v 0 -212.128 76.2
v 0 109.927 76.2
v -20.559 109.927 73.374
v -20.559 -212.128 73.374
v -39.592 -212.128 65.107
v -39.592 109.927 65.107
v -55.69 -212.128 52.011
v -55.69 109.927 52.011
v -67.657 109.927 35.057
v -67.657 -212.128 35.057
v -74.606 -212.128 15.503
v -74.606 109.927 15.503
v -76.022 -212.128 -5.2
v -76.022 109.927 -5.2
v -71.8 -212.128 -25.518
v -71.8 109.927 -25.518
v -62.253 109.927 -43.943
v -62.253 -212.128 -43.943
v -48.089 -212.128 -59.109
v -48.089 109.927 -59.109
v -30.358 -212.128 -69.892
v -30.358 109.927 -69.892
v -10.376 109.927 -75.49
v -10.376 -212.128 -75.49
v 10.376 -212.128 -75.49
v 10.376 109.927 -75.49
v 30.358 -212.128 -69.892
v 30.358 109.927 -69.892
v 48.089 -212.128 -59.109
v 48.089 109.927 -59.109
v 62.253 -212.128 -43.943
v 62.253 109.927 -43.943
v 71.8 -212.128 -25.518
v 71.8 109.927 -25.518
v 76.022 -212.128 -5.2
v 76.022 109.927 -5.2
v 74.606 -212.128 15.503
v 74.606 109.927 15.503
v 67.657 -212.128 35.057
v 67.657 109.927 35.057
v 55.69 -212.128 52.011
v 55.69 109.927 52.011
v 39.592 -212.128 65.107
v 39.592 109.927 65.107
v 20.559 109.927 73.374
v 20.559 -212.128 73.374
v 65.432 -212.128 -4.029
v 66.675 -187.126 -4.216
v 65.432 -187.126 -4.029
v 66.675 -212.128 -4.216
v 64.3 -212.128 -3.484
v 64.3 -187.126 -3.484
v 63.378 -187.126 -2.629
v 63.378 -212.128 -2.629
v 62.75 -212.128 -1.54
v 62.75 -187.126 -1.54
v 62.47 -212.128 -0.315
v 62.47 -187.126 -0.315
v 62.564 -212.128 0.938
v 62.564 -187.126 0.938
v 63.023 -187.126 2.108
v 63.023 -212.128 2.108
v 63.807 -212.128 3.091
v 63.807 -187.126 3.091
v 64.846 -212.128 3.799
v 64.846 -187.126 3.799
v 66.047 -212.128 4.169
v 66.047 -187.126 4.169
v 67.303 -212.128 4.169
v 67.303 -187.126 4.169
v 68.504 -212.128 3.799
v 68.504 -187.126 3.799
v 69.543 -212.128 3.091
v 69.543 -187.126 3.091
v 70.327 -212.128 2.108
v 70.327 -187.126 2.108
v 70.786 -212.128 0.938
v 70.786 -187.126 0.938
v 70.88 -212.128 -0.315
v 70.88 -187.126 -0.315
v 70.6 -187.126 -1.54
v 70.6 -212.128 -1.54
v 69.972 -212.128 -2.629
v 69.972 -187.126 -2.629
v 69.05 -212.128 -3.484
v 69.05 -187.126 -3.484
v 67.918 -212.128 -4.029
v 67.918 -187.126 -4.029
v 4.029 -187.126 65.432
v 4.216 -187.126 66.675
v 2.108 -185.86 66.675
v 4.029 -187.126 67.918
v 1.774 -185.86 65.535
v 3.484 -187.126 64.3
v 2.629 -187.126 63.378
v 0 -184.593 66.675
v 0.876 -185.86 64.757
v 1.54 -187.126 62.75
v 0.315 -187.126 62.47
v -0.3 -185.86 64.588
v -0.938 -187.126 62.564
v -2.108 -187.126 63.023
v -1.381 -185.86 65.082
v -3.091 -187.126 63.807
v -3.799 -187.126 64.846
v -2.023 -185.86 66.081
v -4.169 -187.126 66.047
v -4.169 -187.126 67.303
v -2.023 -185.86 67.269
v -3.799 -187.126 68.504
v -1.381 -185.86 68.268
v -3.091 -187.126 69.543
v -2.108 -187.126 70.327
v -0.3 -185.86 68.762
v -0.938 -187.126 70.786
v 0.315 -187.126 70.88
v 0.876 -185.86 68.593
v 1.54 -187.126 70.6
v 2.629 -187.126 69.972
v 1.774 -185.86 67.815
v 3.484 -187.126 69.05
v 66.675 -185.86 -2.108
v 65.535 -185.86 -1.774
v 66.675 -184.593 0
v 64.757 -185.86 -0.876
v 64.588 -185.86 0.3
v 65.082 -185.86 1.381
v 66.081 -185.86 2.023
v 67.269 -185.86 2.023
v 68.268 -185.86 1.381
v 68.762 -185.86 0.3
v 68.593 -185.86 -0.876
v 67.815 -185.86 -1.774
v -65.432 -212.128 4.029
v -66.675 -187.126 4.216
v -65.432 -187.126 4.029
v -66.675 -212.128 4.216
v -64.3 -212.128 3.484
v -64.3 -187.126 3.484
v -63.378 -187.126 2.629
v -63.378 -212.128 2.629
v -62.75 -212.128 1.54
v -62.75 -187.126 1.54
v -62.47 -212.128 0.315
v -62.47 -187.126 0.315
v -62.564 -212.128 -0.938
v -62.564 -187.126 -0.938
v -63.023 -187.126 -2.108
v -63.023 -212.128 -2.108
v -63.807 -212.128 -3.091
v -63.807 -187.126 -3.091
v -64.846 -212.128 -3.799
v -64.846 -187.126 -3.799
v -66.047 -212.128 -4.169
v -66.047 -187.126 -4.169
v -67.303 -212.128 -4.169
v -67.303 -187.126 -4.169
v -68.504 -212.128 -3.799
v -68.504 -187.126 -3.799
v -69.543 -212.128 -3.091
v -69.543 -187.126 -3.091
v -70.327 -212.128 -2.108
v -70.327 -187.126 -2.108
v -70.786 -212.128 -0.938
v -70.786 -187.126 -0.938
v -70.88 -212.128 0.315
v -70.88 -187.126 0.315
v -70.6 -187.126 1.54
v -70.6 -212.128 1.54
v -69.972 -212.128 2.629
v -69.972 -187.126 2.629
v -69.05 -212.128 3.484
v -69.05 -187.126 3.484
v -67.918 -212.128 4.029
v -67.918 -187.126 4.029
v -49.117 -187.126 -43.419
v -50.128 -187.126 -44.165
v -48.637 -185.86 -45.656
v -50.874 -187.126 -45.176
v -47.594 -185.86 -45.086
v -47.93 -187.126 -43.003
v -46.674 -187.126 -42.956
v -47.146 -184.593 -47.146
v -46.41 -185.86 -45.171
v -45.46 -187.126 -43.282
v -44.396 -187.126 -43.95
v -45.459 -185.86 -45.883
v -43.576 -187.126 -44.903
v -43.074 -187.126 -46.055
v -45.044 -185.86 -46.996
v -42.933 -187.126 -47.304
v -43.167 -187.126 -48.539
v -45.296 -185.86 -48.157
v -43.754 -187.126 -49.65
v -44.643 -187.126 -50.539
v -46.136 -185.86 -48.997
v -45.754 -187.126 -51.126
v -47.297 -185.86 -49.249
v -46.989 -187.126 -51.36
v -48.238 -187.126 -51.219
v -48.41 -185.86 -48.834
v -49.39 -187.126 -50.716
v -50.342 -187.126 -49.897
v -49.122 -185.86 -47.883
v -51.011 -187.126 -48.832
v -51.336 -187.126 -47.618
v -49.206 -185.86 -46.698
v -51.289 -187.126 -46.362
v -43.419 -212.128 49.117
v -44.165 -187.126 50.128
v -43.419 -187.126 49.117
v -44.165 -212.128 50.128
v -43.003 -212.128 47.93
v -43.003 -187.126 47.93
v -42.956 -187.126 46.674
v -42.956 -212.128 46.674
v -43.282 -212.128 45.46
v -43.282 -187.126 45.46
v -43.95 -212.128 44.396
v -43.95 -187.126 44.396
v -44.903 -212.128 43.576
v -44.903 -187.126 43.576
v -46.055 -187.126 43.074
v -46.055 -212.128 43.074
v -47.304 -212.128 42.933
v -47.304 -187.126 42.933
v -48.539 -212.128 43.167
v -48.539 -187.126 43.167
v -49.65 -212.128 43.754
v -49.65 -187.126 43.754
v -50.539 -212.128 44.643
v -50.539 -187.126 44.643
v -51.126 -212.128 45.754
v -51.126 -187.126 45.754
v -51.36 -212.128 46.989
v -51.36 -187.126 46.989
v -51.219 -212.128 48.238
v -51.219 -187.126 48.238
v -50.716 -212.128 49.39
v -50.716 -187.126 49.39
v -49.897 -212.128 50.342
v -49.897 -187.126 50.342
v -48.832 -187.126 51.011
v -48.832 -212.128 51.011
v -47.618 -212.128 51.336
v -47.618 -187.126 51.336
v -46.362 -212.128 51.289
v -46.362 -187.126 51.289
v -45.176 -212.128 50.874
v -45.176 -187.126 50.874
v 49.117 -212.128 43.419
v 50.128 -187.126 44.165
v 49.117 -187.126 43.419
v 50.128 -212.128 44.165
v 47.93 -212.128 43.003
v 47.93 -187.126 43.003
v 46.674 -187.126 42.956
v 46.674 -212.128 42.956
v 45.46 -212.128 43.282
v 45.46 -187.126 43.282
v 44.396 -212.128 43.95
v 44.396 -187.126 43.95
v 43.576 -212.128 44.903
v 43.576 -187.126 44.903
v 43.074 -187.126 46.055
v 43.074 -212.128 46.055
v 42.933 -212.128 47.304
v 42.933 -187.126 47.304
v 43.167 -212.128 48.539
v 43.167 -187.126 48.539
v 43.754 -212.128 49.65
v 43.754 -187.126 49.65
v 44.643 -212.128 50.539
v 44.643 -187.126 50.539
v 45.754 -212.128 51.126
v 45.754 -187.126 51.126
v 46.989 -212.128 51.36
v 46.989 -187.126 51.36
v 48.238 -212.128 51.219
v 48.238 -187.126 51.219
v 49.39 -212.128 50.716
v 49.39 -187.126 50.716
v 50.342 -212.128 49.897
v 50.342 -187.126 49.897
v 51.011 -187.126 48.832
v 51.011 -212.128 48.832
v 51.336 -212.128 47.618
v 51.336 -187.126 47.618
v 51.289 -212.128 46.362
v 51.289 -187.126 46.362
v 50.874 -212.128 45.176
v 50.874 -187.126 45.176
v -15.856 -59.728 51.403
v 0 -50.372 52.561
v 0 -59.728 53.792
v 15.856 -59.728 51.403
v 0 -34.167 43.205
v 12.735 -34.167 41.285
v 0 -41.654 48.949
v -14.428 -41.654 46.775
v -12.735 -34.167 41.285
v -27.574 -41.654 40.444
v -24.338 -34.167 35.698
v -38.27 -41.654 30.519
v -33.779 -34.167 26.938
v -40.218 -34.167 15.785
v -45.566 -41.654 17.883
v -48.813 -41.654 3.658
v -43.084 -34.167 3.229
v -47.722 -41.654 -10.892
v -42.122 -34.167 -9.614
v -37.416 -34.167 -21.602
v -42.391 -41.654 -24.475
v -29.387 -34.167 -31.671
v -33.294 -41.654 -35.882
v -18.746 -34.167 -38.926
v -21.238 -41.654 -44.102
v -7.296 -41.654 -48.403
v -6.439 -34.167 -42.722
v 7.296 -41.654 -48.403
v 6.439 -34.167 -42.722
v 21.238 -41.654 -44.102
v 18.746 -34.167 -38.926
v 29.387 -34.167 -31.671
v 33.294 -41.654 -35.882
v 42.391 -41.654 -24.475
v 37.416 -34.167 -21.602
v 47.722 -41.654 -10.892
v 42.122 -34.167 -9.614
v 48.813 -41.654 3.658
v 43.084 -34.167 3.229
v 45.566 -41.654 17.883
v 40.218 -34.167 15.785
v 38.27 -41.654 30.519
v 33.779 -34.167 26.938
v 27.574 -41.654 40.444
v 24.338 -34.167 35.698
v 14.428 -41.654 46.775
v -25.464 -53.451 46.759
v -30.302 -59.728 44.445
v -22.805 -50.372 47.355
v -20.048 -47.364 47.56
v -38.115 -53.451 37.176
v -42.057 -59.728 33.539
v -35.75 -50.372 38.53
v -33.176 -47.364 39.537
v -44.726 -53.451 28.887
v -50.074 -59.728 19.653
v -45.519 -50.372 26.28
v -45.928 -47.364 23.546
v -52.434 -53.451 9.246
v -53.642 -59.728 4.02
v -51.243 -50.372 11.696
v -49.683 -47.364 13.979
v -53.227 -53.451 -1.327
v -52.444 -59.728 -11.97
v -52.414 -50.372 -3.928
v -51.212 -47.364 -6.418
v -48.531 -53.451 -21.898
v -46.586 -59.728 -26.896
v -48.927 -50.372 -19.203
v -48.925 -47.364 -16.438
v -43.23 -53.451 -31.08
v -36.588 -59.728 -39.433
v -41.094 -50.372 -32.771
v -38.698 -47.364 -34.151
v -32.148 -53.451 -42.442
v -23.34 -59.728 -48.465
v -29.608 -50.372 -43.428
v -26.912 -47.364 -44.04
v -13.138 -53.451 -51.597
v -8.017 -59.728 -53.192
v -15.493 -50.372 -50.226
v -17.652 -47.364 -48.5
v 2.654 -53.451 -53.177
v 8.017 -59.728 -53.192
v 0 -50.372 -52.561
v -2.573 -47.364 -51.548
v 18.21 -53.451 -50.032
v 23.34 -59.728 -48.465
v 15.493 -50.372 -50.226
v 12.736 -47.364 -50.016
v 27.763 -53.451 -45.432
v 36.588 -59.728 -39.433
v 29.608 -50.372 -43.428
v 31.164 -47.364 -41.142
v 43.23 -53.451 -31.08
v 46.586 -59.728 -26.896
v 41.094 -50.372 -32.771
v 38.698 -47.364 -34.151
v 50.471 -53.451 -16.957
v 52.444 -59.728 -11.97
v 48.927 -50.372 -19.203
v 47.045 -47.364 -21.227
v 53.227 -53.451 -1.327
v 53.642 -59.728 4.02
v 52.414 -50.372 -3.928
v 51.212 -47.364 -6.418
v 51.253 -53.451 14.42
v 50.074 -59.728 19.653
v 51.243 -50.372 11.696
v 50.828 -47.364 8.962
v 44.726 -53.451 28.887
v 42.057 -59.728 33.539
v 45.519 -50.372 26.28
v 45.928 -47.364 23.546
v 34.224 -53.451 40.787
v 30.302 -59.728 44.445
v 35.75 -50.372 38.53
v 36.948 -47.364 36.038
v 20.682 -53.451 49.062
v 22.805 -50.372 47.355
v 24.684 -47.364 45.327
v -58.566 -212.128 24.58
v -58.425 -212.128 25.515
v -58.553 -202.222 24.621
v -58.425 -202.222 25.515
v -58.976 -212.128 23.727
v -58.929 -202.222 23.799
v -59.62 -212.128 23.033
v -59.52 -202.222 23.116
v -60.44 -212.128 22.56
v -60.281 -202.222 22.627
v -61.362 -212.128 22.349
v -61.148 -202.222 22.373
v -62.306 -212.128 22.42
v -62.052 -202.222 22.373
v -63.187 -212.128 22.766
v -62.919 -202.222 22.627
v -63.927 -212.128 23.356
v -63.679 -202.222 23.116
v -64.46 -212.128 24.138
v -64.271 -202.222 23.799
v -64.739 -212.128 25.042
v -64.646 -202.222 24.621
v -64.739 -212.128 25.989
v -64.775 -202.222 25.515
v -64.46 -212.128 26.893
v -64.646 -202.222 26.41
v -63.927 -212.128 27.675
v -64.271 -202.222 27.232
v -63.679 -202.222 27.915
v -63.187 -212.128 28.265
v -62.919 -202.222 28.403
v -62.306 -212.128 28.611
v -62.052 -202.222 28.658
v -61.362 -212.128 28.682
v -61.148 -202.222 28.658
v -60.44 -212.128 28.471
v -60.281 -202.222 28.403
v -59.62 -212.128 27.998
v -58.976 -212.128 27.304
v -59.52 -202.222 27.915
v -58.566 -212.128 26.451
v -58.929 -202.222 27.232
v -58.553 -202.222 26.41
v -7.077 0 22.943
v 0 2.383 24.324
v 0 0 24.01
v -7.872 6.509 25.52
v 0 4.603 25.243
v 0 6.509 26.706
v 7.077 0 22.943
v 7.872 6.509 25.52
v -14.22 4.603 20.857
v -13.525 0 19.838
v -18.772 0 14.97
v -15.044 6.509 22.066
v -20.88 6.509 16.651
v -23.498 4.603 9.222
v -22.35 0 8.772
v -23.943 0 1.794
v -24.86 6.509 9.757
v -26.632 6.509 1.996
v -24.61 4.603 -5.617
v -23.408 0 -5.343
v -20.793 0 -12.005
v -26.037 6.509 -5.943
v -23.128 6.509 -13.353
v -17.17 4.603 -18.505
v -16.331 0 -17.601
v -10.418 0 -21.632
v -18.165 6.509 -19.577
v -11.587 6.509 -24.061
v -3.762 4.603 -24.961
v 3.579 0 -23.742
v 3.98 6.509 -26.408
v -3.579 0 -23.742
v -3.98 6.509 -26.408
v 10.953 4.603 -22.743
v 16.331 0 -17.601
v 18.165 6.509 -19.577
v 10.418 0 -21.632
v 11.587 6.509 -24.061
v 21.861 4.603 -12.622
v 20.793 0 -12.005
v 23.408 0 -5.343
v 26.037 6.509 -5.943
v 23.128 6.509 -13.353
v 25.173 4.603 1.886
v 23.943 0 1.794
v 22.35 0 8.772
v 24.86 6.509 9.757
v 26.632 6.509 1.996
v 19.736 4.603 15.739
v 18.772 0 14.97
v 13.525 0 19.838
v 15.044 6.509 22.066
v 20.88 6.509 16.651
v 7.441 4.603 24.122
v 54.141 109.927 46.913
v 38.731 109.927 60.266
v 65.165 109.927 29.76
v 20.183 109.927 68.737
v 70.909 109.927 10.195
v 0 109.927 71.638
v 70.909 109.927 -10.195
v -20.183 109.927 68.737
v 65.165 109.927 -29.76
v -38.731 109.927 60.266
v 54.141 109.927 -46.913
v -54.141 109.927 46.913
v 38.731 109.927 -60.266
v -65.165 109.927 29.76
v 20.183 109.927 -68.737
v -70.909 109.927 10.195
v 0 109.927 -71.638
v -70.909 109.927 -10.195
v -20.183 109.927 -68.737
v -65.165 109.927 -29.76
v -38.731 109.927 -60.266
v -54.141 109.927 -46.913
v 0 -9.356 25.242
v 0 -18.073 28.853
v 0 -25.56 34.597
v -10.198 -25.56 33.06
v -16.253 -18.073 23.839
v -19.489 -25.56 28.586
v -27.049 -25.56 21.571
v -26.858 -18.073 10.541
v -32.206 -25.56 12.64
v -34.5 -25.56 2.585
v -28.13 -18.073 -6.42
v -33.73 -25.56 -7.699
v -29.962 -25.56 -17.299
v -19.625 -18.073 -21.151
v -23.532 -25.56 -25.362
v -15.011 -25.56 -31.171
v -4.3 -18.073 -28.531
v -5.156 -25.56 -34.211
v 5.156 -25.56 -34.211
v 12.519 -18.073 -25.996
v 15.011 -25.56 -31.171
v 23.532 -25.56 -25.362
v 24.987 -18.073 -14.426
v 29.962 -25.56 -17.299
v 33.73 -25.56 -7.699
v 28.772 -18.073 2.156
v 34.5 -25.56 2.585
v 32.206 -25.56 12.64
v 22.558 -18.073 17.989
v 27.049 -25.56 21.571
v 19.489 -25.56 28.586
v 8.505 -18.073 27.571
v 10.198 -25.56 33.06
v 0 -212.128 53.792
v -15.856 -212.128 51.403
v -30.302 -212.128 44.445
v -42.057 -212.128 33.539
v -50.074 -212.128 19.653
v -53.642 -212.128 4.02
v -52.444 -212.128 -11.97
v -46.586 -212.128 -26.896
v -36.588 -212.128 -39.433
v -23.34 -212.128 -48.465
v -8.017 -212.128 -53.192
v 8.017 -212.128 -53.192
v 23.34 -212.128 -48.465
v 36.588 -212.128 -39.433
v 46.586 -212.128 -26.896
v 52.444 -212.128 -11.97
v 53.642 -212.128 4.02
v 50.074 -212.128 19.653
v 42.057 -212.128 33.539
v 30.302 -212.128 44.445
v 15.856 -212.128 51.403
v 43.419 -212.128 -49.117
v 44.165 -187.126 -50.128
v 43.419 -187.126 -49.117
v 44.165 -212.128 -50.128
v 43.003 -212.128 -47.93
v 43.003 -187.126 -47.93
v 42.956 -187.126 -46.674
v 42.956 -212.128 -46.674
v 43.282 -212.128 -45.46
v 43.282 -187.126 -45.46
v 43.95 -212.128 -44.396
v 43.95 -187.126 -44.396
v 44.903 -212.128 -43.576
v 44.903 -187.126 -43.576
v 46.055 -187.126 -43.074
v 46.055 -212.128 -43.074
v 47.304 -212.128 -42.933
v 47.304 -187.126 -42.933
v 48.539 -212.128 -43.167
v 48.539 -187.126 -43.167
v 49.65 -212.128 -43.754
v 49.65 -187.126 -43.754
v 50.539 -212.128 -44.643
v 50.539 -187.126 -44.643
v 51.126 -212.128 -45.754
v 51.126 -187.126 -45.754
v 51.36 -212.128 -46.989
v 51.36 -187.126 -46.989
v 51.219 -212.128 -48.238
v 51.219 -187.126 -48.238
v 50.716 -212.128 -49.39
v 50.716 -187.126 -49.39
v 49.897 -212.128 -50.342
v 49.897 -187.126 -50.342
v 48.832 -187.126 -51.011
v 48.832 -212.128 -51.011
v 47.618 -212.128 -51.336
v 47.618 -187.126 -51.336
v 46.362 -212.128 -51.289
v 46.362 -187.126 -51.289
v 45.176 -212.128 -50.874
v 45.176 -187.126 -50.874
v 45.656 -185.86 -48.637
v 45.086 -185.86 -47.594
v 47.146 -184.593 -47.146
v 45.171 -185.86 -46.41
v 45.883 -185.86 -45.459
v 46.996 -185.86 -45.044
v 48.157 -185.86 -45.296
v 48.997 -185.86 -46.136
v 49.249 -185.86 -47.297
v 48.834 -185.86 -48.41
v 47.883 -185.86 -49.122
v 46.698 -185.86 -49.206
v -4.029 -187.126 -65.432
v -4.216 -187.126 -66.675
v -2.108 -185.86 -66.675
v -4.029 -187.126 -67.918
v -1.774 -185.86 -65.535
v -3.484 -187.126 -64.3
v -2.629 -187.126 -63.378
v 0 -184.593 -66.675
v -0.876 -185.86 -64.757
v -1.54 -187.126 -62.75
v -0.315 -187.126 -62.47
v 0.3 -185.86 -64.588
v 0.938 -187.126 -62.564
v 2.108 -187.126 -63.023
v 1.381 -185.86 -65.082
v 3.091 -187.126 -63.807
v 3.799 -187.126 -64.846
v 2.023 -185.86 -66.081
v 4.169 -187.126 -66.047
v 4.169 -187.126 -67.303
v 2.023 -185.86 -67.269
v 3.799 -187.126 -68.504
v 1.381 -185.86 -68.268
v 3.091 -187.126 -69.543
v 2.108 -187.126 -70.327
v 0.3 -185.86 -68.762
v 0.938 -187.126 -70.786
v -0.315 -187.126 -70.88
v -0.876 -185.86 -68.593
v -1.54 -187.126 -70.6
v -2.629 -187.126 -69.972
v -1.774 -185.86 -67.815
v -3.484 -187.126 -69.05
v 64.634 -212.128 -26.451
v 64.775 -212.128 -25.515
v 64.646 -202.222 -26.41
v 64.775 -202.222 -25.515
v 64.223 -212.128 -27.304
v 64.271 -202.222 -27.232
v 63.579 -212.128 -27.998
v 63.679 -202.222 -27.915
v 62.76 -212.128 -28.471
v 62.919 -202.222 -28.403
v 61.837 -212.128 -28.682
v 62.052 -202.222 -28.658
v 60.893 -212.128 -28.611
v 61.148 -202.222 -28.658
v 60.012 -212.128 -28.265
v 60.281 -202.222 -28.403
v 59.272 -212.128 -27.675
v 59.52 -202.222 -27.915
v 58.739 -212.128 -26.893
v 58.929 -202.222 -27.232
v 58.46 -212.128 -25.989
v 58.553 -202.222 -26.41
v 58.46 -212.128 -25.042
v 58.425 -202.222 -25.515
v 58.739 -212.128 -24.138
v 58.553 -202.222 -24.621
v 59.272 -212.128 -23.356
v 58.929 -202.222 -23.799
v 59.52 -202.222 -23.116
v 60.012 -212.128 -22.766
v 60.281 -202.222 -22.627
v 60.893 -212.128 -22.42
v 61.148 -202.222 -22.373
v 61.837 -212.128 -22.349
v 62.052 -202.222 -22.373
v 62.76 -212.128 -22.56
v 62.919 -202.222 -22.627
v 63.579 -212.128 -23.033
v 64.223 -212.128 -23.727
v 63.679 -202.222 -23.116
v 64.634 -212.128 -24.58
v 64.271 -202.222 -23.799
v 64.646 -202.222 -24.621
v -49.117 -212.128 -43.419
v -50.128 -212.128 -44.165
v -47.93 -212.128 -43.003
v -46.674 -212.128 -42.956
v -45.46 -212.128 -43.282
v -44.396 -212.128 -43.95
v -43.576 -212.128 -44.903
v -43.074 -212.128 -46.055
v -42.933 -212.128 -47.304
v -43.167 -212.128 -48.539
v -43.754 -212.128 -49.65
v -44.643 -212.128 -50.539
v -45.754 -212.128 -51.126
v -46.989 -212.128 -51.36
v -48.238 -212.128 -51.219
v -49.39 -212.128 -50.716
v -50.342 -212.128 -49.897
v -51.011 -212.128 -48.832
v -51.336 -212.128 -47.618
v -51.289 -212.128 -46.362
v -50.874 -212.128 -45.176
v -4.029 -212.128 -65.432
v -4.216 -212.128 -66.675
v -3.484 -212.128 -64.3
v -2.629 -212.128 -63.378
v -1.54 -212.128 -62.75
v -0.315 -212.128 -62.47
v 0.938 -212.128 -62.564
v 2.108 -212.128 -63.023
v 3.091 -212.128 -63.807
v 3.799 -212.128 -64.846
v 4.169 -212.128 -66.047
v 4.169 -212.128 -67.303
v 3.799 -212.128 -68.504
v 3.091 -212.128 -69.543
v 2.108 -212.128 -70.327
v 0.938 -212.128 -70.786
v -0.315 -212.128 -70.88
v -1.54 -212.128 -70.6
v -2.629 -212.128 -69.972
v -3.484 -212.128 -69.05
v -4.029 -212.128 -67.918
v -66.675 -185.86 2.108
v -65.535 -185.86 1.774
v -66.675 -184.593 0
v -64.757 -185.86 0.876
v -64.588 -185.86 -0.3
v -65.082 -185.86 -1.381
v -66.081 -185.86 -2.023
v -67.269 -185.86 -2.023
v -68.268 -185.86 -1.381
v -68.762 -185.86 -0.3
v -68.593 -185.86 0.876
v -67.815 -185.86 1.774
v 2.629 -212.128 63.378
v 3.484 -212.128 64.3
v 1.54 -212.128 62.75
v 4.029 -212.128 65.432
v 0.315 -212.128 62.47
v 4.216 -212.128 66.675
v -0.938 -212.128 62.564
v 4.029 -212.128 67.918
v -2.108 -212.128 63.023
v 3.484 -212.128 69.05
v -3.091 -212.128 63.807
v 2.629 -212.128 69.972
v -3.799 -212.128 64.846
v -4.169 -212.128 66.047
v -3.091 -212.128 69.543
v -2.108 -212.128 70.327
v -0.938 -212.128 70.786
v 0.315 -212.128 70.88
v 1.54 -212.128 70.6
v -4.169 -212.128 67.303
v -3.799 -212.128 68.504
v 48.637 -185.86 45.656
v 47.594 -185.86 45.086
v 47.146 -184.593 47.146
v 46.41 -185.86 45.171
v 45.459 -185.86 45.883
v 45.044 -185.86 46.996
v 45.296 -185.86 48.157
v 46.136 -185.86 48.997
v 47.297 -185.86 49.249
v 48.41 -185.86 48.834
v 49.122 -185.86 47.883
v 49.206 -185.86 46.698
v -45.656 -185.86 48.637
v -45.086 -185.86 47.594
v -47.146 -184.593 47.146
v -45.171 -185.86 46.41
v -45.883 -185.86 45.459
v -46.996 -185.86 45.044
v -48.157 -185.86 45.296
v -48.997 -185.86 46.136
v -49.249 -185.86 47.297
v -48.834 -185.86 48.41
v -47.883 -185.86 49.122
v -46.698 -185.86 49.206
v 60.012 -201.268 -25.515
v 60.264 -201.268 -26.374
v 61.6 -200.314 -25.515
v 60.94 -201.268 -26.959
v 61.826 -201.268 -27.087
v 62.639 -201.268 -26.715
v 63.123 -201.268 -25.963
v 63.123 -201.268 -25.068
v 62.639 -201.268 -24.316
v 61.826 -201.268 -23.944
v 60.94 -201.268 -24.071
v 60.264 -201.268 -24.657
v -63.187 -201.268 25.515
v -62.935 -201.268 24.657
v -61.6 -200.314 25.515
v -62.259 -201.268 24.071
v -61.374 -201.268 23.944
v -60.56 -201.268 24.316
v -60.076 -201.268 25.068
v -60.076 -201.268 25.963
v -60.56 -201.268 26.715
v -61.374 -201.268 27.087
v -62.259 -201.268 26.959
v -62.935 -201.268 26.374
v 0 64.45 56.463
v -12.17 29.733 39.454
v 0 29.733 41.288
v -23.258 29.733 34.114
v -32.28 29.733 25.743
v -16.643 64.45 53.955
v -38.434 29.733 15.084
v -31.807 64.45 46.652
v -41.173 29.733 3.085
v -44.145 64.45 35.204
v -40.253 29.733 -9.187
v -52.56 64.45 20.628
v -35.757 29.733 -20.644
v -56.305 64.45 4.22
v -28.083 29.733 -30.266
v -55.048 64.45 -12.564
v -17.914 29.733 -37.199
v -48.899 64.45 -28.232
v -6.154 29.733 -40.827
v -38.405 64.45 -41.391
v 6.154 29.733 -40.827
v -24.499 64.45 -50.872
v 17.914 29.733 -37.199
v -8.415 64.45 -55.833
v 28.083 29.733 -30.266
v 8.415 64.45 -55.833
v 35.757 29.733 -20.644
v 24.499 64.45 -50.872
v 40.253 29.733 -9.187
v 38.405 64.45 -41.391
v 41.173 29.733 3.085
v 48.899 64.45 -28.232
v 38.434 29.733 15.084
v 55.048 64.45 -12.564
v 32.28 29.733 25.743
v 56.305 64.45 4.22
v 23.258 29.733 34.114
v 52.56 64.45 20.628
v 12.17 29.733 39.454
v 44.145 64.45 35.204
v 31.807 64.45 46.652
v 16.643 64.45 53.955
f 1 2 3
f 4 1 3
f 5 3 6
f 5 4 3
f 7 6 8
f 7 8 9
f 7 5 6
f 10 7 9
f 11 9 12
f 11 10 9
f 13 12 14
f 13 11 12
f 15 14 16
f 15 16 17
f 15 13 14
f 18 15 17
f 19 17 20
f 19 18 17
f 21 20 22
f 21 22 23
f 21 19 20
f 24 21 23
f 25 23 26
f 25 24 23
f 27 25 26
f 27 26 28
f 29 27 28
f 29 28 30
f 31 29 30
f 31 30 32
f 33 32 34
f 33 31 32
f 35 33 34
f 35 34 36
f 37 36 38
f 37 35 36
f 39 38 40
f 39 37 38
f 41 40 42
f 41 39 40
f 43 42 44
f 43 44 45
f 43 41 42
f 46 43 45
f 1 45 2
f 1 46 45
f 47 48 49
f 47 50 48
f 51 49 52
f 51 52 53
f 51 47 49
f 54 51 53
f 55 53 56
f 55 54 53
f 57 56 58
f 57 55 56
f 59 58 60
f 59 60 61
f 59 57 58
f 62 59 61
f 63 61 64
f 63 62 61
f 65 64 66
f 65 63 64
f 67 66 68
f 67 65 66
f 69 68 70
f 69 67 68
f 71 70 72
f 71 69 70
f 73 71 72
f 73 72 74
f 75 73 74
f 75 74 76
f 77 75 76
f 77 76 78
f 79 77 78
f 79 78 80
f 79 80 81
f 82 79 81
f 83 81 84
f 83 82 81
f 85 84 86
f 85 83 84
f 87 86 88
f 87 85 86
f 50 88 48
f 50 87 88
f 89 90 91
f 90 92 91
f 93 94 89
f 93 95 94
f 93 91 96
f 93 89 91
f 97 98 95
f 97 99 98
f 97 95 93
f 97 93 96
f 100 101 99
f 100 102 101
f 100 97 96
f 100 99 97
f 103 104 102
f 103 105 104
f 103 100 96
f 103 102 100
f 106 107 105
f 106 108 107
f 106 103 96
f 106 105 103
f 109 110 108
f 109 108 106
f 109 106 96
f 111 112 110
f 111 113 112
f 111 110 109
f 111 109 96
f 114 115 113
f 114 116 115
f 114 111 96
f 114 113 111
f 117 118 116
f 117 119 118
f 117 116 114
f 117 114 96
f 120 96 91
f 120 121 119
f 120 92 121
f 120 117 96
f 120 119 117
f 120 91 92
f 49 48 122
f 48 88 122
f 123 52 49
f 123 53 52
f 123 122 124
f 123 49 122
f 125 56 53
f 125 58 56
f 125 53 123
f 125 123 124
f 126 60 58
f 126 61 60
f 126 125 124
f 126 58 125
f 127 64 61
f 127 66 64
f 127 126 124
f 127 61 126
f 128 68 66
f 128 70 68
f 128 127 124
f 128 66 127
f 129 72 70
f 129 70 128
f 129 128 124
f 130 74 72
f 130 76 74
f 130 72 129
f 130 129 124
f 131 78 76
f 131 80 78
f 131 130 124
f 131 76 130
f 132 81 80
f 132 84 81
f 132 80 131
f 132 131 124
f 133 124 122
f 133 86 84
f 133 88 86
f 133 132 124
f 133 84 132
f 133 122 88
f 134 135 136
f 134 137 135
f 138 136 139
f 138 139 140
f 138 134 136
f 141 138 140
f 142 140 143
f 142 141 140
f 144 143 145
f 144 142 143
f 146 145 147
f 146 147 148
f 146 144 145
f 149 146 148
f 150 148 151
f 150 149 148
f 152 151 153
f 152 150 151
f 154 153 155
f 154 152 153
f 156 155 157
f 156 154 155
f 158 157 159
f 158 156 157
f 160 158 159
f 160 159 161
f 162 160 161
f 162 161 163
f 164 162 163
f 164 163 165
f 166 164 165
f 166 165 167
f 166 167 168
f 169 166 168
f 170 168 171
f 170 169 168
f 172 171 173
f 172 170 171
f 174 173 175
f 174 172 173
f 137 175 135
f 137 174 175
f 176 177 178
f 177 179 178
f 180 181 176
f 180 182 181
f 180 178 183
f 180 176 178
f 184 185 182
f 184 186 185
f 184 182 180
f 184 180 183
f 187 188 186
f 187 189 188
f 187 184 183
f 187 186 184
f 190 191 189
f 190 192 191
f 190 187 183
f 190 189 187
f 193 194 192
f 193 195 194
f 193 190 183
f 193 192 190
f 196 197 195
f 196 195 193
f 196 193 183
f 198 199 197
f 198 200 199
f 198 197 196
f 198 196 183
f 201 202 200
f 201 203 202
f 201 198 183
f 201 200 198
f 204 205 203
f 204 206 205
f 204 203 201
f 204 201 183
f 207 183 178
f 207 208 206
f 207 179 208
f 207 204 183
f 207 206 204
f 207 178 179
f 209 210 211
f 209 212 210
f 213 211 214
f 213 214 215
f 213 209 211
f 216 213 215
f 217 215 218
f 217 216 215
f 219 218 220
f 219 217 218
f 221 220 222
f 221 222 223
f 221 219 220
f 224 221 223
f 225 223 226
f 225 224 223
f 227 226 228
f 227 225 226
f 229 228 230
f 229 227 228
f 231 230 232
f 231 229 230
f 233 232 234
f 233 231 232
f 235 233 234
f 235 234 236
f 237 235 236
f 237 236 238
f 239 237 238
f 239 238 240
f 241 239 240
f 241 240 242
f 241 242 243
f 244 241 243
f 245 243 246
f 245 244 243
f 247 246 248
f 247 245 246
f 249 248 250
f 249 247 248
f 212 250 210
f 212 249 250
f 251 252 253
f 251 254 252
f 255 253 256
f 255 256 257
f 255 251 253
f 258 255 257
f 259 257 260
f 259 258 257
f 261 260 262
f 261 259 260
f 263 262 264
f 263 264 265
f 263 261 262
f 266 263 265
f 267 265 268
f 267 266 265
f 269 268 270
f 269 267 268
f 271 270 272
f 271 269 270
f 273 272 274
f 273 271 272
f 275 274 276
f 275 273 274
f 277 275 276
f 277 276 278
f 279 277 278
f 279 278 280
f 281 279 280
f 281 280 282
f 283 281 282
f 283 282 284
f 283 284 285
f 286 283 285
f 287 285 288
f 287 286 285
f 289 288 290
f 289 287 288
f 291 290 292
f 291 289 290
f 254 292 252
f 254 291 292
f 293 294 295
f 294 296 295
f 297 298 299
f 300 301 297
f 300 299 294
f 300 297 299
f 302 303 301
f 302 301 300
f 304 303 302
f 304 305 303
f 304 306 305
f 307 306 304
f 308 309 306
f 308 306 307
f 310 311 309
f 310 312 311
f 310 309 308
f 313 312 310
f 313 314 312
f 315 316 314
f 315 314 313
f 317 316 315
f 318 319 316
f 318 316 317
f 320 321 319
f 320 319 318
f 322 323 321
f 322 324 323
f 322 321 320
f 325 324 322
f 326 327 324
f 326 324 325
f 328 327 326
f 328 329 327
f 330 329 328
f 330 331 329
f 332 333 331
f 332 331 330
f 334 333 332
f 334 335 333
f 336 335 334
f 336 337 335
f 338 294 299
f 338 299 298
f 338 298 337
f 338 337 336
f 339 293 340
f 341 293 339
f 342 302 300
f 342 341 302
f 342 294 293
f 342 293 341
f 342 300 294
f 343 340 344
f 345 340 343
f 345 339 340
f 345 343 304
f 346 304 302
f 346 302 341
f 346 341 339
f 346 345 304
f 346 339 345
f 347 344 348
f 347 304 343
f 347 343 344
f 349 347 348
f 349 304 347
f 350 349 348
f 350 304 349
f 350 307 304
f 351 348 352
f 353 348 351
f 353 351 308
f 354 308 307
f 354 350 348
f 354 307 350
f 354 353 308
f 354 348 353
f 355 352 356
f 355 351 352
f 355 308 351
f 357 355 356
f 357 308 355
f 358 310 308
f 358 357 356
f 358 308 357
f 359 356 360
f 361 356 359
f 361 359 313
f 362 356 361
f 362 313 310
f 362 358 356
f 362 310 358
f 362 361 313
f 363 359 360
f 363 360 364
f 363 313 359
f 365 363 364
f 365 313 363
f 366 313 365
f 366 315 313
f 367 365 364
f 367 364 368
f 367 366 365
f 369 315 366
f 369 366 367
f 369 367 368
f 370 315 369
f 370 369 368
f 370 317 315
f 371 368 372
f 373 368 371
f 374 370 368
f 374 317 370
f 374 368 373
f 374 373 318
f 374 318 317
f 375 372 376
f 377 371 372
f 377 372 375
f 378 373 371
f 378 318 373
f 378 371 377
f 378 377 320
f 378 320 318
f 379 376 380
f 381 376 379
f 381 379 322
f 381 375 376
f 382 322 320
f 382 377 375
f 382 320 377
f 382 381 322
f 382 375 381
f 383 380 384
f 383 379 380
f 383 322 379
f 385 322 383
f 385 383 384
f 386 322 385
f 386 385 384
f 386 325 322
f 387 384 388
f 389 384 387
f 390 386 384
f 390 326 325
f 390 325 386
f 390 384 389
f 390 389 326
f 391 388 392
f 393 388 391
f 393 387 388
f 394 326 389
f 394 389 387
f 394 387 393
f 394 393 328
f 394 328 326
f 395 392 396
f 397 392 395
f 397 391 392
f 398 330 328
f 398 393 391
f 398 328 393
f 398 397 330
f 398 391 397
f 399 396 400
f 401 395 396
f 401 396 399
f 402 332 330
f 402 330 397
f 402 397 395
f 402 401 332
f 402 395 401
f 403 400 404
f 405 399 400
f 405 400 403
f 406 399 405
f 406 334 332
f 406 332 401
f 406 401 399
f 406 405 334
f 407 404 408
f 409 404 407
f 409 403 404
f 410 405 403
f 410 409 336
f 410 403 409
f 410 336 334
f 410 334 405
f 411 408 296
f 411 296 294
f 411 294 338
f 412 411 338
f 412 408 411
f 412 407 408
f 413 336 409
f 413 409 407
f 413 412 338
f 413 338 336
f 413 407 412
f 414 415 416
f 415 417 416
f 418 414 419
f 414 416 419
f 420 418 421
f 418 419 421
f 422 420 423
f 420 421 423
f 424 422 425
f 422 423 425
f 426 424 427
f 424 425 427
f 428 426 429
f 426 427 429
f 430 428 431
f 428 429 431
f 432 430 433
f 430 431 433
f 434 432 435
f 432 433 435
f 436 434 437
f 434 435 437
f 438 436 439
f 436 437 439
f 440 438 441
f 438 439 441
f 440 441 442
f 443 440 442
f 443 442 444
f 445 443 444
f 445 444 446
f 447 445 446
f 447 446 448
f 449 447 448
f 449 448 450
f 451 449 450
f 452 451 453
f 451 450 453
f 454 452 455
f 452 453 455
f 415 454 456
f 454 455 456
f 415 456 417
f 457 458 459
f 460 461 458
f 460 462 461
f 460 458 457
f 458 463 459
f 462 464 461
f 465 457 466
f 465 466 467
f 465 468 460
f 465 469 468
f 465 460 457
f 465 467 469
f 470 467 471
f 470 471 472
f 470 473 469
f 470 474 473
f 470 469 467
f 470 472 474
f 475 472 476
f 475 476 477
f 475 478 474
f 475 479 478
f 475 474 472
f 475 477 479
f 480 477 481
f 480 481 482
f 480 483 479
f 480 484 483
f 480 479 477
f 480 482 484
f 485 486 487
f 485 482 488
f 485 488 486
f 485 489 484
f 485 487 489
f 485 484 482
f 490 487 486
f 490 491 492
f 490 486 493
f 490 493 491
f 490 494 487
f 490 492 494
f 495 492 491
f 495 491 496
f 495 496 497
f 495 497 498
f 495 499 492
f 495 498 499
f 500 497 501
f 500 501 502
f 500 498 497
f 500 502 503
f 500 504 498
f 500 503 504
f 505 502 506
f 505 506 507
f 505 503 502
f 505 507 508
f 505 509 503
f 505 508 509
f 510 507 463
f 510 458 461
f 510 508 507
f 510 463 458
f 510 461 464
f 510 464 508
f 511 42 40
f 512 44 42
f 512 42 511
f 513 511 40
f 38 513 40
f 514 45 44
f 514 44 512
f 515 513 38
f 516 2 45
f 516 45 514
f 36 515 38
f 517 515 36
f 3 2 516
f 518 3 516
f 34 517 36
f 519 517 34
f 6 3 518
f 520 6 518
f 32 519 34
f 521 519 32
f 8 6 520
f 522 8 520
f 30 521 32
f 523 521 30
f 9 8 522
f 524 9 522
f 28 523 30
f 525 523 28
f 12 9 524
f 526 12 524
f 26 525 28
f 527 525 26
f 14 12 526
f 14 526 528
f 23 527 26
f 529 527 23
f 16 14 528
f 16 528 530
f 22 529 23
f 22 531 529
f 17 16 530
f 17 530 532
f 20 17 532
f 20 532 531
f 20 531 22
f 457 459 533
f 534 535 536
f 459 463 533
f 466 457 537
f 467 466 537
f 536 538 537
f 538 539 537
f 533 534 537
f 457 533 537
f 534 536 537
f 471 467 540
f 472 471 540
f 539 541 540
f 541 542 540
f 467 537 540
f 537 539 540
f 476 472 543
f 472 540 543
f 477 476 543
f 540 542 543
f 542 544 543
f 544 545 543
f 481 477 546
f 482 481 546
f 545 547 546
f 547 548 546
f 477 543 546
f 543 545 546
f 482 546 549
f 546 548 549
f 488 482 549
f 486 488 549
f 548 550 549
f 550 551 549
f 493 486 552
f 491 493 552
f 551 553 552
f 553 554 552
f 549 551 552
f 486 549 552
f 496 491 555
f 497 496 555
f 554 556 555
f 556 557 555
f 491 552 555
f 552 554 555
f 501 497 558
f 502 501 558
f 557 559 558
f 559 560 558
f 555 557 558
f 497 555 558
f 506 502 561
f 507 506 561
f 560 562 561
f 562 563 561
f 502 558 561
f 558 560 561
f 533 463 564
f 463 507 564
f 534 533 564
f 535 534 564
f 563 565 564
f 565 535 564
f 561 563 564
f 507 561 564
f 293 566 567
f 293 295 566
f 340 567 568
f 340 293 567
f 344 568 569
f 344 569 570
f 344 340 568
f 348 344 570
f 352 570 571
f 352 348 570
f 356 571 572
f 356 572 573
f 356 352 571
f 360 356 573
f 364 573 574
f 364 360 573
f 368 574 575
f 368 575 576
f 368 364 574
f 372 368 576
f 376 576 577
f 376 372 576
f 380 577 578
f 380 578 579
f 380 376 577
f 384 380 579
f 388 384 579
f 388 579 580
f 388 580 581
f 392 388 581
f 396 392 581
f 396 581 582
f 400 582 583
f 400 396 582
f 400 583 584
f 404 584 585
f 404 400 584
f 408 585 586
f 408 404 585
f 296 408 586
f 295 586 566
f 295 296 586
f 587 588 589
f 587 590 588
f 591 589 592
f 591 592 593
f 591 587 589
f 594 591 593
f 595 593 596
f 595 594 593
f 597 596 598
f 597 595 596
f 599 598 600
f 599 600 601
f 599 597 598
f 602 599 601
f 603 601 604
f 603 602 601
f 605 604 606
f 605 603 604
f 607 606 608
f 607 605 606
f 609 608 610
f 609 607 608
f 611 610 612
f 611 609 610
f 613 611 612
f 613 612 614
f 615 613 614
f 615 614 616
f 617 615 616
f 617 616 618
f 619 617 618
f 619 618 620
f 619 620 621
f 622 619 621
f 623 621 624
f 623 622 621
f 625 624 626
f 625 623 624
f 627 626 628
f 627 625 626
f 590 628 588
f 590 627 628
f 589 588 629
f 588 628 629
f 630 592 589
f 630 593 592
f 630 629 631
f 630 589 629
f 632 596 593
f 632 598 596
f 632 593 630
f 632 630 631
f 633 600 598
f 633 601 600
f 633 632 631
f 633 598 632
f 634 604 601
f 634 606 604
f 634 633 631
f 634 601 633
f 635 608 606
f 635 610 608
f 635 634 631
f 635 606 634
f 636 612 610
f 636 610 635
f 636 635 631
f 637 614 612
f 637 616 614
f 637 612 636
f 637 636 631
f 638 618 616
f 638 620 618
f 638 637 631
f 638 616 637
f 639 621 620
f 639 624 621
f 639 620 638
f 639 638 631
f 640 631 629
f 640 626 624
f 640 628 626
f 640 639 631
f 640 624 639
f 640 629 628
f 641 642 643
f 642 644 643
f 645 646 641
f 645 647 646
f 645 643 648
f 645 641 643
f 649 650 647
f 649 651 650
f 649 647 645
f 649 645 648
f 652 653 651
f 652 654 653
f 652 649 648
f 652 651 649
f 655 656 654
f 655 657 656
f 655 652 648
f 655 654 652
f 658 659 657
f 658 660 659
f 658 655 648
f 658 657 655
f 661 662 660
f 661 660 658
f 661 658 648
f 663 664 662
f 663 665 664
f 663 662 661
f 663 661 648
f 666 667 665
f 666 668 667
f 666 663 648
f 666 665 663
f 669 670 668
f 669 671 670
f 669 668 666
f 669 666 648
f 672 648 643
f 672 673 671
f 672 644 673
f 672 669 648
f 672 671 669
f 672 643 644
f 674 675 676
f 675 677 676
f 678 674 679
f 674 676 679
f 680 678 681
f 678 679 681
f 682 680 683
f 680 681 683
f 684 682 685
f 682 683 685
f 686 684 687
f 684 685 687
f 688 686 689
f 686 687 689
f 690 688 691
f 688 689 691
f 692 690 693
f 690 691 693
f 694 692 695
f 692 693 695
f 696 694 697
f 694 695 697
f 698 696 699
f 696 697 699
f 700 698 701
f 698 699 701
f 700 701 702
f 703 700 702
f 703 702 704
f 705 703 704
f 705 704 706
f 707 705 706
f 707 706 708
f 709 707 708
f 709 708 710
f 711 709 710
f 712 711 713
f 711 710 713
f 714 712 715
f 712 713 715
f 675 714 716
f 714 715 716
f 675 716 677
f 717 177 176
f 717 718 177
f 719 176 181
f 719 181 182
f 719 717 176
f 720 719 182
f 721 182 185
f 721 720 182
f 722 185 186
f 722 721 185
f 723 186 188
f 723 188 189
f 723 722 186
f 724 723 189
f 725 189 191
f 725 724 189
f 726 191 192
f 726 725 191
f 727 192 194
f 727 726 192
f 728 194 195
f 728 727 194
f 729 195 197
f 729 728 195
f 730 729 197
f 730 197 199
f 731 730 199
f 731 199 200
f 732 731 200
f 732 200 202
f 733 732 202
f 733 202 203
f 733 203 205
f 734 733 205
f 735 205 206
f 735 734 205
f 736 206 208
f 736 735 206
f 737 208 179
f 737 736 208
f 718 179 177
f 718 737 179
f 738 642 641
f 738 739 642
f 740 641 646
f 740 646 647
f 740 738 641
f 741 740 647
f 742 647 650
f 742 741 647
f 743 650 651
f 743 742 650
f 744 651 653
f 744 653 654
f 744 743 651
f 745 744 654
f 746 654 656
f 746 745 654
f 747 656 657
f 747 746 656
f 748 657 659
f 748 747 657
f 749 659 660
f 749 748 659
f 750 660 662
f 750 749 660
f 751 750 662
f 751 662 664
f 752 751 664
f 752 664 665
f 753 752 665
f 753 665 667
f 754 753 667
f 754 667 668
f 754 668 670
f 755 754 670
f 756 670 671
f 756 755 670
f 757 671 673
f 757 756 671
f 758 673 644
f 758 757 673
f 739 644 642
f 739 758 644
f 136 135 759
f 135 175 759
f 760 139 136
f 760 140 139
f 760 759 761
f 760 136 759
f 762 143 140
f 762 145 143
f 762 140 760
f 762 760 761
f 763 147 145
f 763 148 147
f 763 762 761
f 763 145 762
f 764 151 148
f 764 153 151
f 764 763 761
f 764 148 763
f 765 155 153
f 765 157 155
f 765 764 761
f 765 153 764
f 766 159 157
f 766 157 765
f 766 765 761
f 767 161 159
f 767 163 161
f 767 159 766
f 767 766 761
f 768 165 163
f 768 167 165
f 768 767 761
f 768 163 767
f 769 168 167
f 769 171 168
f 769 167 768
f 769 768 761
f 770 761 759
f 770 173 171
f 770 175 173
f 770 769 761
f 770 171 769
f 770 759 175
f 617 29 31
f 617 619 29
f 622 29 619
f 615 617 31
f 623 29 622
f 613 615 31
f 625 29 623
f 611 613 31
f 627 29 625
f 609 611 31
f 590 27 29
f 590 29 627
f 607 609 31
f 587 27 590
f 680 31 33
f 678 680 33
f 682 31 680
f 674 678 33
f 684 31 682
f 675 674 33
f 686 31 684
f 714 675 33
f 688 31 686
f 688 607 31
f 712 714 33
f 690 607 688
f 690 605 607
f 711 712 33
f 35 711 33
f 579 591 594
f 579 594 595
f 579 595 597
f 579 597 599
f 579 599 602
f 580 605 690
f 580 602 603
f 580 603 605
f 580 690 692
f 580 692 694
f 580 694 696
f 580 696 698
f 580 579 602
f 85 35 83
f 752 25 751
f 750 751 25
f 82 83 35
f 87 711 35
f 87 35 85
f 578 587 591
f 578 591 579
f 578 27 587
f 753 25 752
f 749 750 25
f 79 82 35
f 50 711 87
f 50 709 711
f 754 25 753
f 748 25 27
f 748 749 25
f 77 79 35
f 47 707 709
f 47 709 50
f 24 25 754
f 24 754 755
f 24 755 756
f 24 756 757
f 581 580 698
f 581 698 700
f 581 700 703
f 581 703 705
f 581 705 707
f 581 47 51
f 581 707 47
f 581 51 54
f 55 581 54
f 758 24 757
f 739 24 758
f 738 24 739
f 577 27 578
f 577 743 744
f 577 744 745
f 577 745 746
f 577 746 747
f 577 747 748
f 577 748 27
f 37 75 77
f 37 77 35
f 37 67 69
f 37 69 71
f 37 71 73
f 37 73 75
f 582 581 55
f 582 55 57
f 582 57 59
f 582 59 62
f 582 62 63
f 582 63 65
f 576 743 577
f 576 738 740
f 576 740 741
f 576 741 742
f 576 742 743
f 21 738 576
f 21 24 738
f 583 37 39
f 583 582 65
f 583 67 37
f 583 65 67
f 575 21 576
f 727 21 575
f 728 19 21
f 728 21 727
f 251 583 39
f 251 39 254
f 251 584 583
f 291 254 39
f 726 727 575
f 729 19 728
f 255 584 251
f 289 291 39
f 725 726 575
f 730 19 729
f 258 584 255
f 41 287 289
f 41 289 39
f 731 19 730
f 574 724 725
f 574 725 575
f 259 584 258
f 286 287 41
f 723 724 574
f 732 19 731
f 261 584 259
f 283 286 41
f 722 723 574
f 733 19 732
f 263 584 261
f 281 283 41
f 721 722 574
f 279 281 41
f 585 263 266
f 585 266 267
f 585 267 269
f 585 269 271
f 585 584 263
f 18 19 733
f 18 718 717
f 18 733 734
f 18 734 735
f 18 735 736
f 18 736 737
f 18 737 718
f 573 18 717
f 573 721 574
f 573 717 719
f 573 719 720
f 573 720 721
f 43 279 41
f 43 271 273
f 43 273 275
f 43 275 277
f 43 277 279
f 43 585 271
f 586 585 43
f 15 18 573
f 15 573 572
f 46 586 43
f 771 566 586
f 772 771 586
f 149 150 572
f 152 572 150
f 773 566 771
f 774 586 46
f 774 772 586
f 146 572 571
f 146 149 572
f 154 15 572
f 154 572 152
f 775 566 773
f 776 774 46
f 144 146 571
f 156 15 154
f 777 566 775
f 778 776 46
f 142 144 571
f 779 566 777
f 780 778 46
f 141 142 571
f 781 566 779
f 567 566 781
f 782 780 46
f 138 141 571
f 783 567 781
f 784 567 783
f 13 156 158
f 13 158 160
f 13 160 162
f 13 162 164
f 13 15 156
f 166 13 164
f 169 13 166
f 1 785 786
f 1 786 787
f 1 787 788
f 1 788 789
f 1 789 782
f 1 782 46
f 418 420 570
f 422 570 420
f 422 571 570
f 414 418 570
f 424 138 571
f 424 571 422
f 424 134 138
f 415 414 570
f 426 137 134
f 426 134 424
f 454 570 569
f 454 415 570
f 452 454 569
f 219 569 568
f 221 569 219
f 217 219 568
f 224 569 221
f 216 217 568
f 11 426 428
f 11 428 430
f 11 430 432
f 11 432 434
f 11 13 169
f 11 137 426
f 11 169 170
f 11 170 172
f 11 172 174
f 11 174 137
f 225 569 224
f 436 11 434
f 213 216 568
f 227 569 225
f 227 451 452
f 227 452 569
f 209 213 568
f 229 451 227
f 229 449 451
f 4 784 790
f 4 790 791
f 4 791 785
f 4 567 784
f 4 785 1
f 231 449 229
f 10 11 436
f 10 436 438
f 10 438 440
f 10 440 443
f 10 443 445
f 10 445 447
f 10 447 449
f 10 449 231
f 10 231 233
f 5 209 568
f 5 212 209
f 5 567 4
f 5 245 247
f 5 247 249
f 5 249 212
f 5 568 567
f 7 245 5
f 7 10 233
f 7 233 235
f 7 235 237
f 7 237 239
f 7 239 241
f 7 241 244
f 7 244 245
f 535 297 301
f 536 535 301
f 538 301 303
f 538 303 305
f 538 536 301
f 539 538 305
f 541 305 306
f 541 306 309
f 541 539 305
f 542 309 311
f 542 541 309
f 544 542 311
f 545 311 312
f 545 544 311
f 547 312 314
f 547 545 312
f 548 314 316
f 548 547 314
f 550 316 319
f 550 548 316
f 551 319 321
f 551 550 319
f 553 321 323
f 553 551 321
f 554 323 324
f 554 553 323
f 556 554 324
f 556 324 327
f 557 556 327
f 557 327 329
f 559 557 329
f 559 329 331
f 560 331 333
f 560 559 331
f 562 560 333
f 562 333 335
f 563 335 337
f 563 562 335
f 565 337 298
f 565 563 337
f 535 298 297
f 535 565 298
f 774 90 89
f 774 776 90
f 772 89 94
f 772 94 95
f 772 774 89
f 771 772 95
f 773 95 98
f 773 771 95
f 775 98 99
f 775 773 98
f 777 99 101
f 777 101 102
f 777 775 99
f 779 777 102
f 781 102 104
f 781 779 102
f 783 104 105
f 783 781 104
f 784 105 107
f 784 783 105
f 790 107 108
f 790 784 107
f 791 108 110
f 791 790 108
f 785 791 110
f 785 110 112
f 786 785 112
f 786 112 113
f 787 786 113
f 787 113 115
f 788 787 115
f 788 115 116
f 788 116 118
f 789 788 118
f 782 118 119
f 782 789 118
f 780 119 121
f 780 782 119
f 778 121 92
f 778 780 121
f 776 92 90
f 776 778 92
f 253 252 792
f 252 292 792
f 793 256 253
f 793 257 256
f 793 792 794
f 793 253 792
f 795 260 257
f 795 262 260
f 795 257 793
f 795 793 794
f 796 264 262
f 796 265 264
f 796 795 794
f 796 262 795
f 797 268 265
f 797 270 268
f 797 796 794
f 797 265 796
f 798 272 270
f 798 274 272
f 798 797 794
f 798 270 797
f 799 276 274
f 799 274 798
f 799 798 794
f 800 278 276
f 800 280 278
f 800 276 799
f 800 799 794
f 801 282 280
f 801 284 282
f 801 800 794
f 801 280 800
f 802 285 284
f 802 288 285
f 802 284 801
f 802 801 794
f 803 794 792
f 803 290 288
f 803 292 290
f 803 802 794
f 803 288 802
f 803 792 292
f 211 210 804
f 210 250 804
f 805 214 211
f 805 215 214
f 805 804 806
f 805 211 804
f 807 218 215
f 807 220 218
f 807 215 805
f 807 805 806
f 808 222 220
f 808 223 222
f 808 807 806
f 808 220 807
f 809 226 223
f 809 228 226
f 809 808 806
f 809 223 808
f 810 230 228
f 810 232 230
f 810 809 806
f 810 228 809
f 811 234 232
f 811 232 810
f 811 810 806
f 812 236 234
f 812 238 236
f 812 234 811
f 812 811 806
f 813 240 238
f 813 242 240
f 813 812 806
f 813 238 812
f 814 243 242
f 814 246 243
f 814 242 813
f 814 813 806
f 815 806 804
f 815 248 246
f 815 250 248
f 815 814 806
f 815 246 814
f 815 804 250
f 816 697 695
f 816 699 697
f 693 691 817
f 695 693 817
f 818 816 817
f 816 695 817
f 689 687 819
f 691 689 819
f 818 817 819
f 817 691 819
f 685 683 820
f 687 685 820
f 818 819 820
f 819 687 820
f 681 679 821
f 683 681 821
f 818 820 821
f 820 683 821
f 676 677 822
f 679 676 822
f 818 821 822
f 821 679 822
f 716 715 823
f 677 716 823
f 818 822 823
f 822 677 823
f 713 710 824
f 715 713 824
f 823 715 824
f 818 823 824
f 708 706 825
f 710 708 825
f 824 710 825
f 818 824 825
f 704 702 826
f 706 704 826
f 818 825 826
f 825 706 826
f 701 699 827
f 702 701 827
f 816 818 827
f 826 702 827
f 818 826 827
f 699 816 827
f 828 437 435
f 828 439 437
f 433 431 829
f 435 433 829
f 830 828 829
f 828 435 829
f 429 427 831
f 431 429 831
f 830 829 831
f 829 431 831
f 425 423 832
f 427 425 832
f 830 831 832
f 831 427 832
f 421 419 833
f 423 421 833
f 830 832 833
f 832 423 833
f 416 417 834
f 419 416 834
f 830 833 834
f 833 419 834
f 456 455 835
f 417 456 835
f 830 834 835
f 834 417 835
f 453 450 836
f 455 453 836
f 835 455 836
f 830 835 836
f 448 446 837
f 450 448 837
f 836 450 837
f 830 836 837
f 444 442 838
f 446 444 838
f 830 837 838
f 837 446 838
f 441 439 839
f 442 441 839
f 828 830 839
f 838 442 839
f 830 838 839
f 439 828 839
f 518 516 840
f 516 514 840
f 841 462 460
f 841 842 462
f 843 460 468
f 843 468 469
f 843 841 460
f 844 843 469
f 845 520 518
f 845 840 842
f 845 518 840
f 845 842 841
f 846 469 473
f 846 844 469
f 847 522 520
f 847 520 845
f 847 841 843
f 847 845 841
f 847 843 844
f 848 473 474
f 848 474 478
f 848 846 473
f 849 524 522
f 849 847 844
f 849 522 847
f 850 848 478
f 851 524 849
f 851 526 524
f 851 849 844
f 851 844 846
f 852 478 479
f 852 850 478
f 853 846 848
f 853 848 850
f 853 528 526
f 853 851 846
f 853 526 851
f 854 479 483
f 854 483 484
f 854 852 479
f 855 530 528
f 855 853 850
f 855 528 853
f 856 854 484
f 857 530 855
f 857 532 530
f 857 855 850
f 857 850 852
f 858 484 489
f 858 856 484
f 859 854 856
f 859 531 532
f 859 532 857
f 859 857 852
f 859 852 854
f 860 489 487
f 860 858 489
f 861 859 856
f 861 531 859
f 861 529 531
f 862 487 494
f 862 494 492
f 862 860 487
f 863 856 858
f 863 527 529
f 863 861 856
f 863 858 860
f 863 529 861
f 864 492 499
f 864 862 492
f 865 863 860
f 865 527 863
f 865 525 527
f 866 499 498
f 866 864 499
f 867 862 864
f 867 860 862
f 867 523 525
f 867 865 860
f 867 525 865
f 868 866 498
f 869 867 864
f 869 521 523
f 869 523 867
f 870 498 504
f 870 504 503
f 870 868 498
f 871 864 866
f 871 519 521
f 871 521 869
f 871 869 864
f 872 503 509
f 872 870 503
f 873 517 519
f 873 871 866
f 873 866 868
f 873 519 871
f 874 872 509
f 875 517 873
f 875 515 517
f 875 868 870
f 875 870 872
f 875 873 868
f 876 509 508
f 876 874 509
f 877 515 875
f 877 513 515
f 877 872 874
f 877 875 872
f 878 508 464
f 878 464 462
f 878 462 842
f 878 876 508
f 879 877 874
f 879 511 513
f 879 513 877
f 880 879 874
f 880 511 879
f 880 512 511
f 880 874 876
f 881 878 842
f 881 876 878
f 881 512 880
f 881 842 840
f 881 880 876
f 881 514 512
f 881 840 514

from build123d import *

# Parameters (mm, degrees)
CIRPATTERN1_COUNT              = 8
F_1_4_0_2500_DOWEL_HOLE1_D     = 6.35
F_1_4_0_2500_DOWEL_HOLE1_DEPTH = 9.906
F_1_4_0_2500_DOWEL_HOLE1_TIP   = 1.907732465


with BuildPart() as part:
    # Sketch1 → Revolve2 (revolve)
    with BuildSketch(Plane.XY, mode=Mode.PRIVATE) as revolve2_sk:
        with BuildLine():
            Line((71.638455479, 109.927347077), (76.2, 109.927347077))
            Line((76.2, 109.927347077), (76.2, -212.127673762))
            Line((76.2, -212.127673762), (53.792460107, -212.127673762))
            Line((53.792460107, -212.127673762), (53.792460107, -59.727673762))
            add(Edge.make_bspline(
                [(53.792460107, -59.727673762), (53.792458875, -59.657143693), (53.79192973, -59.515566639), (53.789553877, -59.181725153), (53.783229275, -58.904956029), (53.773743784, -58.532728024), (53.761100883, -58.212998158), (53.741350051, -57.781754979), (53.711337705, -57.281120436), (53.667125535, -56.688158703), (53.588220857, -55.848640904), (53.488359258, -55.0083264), (53.367608174, -54.172595971), (53.197743199, -53.172585782), (53.002996554, -52.177603366), (52.777307477, -51.18869963), (52.520946571, -50.207649587), (52.240221677, -49.233238292), (51.935281065, -48.266129779), (51.544470146, -47.149295627), (51.050452662, -45.89056897), (50.509666041, -44.651129374), (49.922993204, -43.432862102), (49.291052494, -42.237253822), (48.61505748, -41.066315469), (47.895407759, -39.921133254), (47.134034366, -38.804236844), (46.430801278, -37.851612398), (45.804470147, -37.055832742), (45.263749884, -36.403541907), (44.826059146, -35.894408262), (44.425708383, -35.447153291), (44.092389692, -35.084791822), (43.78485681, -34.760500791), (43.58500459, -34.551710093), (43.355324254, -34.318676932), (43.254715332, -34.217322701), (43.204843184, -34.167450314)],
                knots=[0.082637729, 0.082637729, 0.082637729, 0.082637729, 0.082637729, 0.092574926, 0.102512123, 0.11244932, 0.122386517, 0.132323714, 0.142260911, 0.162135305, 0.182009699, 0.201884093, 0.24163288, 0.261507274, 0.281381668, 0.321130456, 0.360879243, 0.380753637, 0.400628031, 0.440376819, 0.480125606, 0.519874394, 0.559623181, 0.599371969, 0.639120757, 0.678869544, 0.718618332, 0.75836712, 0.798115907, 0.817990301, 0.837864695, 0.857739089, 0.877613483, 0.88755068, 0.897487877, 0.907425074, 0.91736227, 0.91736227, 0.91736227, 0.91736227, 0.91736227], degree=4))
            Line((43.204843184, -34.167450314), (34.597214986, -25.559822117))
            add(Edge.make_bspline(
                [(24.01, 0), (24.010001231, -0.070528647), (24.010530378, -0.21358419), (24.012906064, -0.543182916), (24.019230459, -0.824160397), (24.02871558, -1.194822071), (24.041357874, -1.513435058), (24.057158098, -1.861939603), (24.076113357, -2.193706871), (24.103750972, -2.6180694), (24.14321918, -3.122033947), (24.214231842, -3.879978675), (24.334058815, -4.886450388), (24.510418183, -6.05671076), (24.761817375, -7.385166415), (25.062727459, -8.703574514), (25.412702772, -10.009637209), (25.811293135, -11.301819597), (26.257877546, -12.578099335), (26.75193548, -13.836887484), (27.292605281, -15.076197129), (27.879411549, -16.294609794), (28.511071563, -17.489938794), (29.187464564, -18.661287757), (29.906377272, -19.805743397), (30.668954172, -20.923860075), (31.370099368, -21.87441176), (31.9996683, -22.673445481), (32.535060595, -23.320422138), (32.983187947, -23.840005017), (33.419382207, -24.329816247), (33.846758303, -24.78848439), (34.156490822, -25.113868311), (34.44779214, -25.409649047), (34.547344609, -25.509949933), (34.597214986, -25.559822117)],
                knots=[0.082637729, 0.082637729, 0.082637729, 0.082637729, 0.082637729, 0.092574926, 0.102512123, 0.11244932, 0.122386517, 0.132323714, 0.142260911, 0.152198108, 0.162135305, 0.182009699, 0.201884093, 0.24163288, 0.281381668, 0.321130456, 0.360879243, 0.400628031, 0.440376819, 0.480125606, 0.519874394, 0.559623181, 0.599371969, 0.639120757, 0.678869544, 0.718618332, 0.75836712, 0.798115907, 0.817990301, 0.837864695, 0.857739089, 0.877613483, 0.897487877, 0.907425074, 0.91736227, 0.91736227, 0.91736227, 0.91736227, 0.91736227], degree=4))
            add(Edge.make_bspline(
                [(24.01, 0), (24.010000626, 0.035892652), (24.010538457, 0.11011369), (24.012955849, 0.267641069), (24.019393694, 0.427064117), (24.031465725, 0.646764266), (24.052367213, 0.901433328), (24.086116845, 1.202537273), (24.137431431, 1.542050498), (24.201475827, 1.880996777), (24.278073727, 2.21635442), (24.367255697, 2.549239421), (24.468673539, 2.878092645), (24.582551197, 3.203347041), (24.708128897, 3.523627157), (24.846218103, 3.839666733), (24.995002427, 4.149282184), (25.156944348, 4.454783123), (25.327420631, 4.751301575), (25.513446847, 5.045703861), (25.702720396, 5.325518936), (25.9153376, 5.610727543), (26.0898085, 5.832913647), (26.277277882, 6.049951637), (26.415487374, 6.208641646), (26.581374196, 6.382121779), (26.655452387, 6.458478841), (26.706211329, 6.50923965)],
                knots=[0.082568816, 0.082568816, 0.082568816, 0.082568816, 0.082568816, 0.102426634, 0.122284453, 0.142142271, 0.162000089, 0.201715725, 0.241431362, 0.281146998, 0.320862634, 0.360578271, 0.400293907, 0.440009544, 0.47972518, 0.519440816, 0.559156453, 0.598872089, 0.638587725, 0.678303362, 0.718018998, 0.757734635, 0.797450271, 0.837165907, 0.857023726, 0.876881544, 0.91659718, 0.91659718, 0.91659718, 0.91659718, 0.91659718], degree=4))
            add(Edge.make_bspline(
                [(26.706211329, 6.50923965), (49.172333461, 34.635954224), (71.638455479, 109.927347077)],
                knots=[0, 0, 0, 1, 1, 1], degree=2))
        make_face()
    revolve(revolve2_sk.sketch.rotate(Axis((0, 0, 0), (0, -1, 0)), 90), axis=Axis((0, 0, 0), (0, -1, 0)))

    # Sketch4 → 3/8-24 Tapped Hole1 (revolve, cut)
    with BuildSketch(Plane(origin=(66.675, -212.127673762, 0), x_dir=(0, 0, -1), z_dir=(1, 0, 0))):
        Polygon((0, 0), (0, 27.534688714), (4.2164, 25.00122), (4.2164, 0), align=None)
    f_3_8_24_tapped_hole1 = revolve(axis=Axis((66.675, -218.477673762, 0), (0, 1, 0)), mode=Mode.SUBTRACT)

    # CirPattern1: 3/8-24 Tapped Hole1 ×8 about axis
    cirpattern1_axis = Axis((0, 0, 0), (0, 1, 0))
    for i in range(1, CIRPATTERN1_COUNT):
        add(f_3_8_24_tapped_hole1.rotate(cirpattern1_axis, i * 360 / CIRPATTERN1_COUNT), mode=Mode.SUBTRACT)

    # 1/4 (0.2500) Dowel Hole1
    with Locations(Plane(origin=(0, -212.127673762, 0), x_dir=(-1, 0, 0), z_dir=(0, -1, 0))):
        with Locations((-61.59966783, 25.515417853), (61.59966783, -25.515417853)):
            Hole(F_1_4_0_2500_DOWEL_HOLE1_D / 2, depth=F_1_4_0_2500_DOWEL_HOLE1_DEPTH)
            with Locations((0, 0, -(F_1_4_0_2500_DOWEL_HOLE1_DEPTH + F_1_4_0_2500_DOWEL_HOLE1_TIP / 2))):  # 118° drill point
                Cone(0, F_1_4_0_2500_DOWEL_HOLE1_D / 2, F_1_4_0_2500_DOWEL_HOLE1_TIP, mode=Mode.SUBTRACT)


solid = part.part
